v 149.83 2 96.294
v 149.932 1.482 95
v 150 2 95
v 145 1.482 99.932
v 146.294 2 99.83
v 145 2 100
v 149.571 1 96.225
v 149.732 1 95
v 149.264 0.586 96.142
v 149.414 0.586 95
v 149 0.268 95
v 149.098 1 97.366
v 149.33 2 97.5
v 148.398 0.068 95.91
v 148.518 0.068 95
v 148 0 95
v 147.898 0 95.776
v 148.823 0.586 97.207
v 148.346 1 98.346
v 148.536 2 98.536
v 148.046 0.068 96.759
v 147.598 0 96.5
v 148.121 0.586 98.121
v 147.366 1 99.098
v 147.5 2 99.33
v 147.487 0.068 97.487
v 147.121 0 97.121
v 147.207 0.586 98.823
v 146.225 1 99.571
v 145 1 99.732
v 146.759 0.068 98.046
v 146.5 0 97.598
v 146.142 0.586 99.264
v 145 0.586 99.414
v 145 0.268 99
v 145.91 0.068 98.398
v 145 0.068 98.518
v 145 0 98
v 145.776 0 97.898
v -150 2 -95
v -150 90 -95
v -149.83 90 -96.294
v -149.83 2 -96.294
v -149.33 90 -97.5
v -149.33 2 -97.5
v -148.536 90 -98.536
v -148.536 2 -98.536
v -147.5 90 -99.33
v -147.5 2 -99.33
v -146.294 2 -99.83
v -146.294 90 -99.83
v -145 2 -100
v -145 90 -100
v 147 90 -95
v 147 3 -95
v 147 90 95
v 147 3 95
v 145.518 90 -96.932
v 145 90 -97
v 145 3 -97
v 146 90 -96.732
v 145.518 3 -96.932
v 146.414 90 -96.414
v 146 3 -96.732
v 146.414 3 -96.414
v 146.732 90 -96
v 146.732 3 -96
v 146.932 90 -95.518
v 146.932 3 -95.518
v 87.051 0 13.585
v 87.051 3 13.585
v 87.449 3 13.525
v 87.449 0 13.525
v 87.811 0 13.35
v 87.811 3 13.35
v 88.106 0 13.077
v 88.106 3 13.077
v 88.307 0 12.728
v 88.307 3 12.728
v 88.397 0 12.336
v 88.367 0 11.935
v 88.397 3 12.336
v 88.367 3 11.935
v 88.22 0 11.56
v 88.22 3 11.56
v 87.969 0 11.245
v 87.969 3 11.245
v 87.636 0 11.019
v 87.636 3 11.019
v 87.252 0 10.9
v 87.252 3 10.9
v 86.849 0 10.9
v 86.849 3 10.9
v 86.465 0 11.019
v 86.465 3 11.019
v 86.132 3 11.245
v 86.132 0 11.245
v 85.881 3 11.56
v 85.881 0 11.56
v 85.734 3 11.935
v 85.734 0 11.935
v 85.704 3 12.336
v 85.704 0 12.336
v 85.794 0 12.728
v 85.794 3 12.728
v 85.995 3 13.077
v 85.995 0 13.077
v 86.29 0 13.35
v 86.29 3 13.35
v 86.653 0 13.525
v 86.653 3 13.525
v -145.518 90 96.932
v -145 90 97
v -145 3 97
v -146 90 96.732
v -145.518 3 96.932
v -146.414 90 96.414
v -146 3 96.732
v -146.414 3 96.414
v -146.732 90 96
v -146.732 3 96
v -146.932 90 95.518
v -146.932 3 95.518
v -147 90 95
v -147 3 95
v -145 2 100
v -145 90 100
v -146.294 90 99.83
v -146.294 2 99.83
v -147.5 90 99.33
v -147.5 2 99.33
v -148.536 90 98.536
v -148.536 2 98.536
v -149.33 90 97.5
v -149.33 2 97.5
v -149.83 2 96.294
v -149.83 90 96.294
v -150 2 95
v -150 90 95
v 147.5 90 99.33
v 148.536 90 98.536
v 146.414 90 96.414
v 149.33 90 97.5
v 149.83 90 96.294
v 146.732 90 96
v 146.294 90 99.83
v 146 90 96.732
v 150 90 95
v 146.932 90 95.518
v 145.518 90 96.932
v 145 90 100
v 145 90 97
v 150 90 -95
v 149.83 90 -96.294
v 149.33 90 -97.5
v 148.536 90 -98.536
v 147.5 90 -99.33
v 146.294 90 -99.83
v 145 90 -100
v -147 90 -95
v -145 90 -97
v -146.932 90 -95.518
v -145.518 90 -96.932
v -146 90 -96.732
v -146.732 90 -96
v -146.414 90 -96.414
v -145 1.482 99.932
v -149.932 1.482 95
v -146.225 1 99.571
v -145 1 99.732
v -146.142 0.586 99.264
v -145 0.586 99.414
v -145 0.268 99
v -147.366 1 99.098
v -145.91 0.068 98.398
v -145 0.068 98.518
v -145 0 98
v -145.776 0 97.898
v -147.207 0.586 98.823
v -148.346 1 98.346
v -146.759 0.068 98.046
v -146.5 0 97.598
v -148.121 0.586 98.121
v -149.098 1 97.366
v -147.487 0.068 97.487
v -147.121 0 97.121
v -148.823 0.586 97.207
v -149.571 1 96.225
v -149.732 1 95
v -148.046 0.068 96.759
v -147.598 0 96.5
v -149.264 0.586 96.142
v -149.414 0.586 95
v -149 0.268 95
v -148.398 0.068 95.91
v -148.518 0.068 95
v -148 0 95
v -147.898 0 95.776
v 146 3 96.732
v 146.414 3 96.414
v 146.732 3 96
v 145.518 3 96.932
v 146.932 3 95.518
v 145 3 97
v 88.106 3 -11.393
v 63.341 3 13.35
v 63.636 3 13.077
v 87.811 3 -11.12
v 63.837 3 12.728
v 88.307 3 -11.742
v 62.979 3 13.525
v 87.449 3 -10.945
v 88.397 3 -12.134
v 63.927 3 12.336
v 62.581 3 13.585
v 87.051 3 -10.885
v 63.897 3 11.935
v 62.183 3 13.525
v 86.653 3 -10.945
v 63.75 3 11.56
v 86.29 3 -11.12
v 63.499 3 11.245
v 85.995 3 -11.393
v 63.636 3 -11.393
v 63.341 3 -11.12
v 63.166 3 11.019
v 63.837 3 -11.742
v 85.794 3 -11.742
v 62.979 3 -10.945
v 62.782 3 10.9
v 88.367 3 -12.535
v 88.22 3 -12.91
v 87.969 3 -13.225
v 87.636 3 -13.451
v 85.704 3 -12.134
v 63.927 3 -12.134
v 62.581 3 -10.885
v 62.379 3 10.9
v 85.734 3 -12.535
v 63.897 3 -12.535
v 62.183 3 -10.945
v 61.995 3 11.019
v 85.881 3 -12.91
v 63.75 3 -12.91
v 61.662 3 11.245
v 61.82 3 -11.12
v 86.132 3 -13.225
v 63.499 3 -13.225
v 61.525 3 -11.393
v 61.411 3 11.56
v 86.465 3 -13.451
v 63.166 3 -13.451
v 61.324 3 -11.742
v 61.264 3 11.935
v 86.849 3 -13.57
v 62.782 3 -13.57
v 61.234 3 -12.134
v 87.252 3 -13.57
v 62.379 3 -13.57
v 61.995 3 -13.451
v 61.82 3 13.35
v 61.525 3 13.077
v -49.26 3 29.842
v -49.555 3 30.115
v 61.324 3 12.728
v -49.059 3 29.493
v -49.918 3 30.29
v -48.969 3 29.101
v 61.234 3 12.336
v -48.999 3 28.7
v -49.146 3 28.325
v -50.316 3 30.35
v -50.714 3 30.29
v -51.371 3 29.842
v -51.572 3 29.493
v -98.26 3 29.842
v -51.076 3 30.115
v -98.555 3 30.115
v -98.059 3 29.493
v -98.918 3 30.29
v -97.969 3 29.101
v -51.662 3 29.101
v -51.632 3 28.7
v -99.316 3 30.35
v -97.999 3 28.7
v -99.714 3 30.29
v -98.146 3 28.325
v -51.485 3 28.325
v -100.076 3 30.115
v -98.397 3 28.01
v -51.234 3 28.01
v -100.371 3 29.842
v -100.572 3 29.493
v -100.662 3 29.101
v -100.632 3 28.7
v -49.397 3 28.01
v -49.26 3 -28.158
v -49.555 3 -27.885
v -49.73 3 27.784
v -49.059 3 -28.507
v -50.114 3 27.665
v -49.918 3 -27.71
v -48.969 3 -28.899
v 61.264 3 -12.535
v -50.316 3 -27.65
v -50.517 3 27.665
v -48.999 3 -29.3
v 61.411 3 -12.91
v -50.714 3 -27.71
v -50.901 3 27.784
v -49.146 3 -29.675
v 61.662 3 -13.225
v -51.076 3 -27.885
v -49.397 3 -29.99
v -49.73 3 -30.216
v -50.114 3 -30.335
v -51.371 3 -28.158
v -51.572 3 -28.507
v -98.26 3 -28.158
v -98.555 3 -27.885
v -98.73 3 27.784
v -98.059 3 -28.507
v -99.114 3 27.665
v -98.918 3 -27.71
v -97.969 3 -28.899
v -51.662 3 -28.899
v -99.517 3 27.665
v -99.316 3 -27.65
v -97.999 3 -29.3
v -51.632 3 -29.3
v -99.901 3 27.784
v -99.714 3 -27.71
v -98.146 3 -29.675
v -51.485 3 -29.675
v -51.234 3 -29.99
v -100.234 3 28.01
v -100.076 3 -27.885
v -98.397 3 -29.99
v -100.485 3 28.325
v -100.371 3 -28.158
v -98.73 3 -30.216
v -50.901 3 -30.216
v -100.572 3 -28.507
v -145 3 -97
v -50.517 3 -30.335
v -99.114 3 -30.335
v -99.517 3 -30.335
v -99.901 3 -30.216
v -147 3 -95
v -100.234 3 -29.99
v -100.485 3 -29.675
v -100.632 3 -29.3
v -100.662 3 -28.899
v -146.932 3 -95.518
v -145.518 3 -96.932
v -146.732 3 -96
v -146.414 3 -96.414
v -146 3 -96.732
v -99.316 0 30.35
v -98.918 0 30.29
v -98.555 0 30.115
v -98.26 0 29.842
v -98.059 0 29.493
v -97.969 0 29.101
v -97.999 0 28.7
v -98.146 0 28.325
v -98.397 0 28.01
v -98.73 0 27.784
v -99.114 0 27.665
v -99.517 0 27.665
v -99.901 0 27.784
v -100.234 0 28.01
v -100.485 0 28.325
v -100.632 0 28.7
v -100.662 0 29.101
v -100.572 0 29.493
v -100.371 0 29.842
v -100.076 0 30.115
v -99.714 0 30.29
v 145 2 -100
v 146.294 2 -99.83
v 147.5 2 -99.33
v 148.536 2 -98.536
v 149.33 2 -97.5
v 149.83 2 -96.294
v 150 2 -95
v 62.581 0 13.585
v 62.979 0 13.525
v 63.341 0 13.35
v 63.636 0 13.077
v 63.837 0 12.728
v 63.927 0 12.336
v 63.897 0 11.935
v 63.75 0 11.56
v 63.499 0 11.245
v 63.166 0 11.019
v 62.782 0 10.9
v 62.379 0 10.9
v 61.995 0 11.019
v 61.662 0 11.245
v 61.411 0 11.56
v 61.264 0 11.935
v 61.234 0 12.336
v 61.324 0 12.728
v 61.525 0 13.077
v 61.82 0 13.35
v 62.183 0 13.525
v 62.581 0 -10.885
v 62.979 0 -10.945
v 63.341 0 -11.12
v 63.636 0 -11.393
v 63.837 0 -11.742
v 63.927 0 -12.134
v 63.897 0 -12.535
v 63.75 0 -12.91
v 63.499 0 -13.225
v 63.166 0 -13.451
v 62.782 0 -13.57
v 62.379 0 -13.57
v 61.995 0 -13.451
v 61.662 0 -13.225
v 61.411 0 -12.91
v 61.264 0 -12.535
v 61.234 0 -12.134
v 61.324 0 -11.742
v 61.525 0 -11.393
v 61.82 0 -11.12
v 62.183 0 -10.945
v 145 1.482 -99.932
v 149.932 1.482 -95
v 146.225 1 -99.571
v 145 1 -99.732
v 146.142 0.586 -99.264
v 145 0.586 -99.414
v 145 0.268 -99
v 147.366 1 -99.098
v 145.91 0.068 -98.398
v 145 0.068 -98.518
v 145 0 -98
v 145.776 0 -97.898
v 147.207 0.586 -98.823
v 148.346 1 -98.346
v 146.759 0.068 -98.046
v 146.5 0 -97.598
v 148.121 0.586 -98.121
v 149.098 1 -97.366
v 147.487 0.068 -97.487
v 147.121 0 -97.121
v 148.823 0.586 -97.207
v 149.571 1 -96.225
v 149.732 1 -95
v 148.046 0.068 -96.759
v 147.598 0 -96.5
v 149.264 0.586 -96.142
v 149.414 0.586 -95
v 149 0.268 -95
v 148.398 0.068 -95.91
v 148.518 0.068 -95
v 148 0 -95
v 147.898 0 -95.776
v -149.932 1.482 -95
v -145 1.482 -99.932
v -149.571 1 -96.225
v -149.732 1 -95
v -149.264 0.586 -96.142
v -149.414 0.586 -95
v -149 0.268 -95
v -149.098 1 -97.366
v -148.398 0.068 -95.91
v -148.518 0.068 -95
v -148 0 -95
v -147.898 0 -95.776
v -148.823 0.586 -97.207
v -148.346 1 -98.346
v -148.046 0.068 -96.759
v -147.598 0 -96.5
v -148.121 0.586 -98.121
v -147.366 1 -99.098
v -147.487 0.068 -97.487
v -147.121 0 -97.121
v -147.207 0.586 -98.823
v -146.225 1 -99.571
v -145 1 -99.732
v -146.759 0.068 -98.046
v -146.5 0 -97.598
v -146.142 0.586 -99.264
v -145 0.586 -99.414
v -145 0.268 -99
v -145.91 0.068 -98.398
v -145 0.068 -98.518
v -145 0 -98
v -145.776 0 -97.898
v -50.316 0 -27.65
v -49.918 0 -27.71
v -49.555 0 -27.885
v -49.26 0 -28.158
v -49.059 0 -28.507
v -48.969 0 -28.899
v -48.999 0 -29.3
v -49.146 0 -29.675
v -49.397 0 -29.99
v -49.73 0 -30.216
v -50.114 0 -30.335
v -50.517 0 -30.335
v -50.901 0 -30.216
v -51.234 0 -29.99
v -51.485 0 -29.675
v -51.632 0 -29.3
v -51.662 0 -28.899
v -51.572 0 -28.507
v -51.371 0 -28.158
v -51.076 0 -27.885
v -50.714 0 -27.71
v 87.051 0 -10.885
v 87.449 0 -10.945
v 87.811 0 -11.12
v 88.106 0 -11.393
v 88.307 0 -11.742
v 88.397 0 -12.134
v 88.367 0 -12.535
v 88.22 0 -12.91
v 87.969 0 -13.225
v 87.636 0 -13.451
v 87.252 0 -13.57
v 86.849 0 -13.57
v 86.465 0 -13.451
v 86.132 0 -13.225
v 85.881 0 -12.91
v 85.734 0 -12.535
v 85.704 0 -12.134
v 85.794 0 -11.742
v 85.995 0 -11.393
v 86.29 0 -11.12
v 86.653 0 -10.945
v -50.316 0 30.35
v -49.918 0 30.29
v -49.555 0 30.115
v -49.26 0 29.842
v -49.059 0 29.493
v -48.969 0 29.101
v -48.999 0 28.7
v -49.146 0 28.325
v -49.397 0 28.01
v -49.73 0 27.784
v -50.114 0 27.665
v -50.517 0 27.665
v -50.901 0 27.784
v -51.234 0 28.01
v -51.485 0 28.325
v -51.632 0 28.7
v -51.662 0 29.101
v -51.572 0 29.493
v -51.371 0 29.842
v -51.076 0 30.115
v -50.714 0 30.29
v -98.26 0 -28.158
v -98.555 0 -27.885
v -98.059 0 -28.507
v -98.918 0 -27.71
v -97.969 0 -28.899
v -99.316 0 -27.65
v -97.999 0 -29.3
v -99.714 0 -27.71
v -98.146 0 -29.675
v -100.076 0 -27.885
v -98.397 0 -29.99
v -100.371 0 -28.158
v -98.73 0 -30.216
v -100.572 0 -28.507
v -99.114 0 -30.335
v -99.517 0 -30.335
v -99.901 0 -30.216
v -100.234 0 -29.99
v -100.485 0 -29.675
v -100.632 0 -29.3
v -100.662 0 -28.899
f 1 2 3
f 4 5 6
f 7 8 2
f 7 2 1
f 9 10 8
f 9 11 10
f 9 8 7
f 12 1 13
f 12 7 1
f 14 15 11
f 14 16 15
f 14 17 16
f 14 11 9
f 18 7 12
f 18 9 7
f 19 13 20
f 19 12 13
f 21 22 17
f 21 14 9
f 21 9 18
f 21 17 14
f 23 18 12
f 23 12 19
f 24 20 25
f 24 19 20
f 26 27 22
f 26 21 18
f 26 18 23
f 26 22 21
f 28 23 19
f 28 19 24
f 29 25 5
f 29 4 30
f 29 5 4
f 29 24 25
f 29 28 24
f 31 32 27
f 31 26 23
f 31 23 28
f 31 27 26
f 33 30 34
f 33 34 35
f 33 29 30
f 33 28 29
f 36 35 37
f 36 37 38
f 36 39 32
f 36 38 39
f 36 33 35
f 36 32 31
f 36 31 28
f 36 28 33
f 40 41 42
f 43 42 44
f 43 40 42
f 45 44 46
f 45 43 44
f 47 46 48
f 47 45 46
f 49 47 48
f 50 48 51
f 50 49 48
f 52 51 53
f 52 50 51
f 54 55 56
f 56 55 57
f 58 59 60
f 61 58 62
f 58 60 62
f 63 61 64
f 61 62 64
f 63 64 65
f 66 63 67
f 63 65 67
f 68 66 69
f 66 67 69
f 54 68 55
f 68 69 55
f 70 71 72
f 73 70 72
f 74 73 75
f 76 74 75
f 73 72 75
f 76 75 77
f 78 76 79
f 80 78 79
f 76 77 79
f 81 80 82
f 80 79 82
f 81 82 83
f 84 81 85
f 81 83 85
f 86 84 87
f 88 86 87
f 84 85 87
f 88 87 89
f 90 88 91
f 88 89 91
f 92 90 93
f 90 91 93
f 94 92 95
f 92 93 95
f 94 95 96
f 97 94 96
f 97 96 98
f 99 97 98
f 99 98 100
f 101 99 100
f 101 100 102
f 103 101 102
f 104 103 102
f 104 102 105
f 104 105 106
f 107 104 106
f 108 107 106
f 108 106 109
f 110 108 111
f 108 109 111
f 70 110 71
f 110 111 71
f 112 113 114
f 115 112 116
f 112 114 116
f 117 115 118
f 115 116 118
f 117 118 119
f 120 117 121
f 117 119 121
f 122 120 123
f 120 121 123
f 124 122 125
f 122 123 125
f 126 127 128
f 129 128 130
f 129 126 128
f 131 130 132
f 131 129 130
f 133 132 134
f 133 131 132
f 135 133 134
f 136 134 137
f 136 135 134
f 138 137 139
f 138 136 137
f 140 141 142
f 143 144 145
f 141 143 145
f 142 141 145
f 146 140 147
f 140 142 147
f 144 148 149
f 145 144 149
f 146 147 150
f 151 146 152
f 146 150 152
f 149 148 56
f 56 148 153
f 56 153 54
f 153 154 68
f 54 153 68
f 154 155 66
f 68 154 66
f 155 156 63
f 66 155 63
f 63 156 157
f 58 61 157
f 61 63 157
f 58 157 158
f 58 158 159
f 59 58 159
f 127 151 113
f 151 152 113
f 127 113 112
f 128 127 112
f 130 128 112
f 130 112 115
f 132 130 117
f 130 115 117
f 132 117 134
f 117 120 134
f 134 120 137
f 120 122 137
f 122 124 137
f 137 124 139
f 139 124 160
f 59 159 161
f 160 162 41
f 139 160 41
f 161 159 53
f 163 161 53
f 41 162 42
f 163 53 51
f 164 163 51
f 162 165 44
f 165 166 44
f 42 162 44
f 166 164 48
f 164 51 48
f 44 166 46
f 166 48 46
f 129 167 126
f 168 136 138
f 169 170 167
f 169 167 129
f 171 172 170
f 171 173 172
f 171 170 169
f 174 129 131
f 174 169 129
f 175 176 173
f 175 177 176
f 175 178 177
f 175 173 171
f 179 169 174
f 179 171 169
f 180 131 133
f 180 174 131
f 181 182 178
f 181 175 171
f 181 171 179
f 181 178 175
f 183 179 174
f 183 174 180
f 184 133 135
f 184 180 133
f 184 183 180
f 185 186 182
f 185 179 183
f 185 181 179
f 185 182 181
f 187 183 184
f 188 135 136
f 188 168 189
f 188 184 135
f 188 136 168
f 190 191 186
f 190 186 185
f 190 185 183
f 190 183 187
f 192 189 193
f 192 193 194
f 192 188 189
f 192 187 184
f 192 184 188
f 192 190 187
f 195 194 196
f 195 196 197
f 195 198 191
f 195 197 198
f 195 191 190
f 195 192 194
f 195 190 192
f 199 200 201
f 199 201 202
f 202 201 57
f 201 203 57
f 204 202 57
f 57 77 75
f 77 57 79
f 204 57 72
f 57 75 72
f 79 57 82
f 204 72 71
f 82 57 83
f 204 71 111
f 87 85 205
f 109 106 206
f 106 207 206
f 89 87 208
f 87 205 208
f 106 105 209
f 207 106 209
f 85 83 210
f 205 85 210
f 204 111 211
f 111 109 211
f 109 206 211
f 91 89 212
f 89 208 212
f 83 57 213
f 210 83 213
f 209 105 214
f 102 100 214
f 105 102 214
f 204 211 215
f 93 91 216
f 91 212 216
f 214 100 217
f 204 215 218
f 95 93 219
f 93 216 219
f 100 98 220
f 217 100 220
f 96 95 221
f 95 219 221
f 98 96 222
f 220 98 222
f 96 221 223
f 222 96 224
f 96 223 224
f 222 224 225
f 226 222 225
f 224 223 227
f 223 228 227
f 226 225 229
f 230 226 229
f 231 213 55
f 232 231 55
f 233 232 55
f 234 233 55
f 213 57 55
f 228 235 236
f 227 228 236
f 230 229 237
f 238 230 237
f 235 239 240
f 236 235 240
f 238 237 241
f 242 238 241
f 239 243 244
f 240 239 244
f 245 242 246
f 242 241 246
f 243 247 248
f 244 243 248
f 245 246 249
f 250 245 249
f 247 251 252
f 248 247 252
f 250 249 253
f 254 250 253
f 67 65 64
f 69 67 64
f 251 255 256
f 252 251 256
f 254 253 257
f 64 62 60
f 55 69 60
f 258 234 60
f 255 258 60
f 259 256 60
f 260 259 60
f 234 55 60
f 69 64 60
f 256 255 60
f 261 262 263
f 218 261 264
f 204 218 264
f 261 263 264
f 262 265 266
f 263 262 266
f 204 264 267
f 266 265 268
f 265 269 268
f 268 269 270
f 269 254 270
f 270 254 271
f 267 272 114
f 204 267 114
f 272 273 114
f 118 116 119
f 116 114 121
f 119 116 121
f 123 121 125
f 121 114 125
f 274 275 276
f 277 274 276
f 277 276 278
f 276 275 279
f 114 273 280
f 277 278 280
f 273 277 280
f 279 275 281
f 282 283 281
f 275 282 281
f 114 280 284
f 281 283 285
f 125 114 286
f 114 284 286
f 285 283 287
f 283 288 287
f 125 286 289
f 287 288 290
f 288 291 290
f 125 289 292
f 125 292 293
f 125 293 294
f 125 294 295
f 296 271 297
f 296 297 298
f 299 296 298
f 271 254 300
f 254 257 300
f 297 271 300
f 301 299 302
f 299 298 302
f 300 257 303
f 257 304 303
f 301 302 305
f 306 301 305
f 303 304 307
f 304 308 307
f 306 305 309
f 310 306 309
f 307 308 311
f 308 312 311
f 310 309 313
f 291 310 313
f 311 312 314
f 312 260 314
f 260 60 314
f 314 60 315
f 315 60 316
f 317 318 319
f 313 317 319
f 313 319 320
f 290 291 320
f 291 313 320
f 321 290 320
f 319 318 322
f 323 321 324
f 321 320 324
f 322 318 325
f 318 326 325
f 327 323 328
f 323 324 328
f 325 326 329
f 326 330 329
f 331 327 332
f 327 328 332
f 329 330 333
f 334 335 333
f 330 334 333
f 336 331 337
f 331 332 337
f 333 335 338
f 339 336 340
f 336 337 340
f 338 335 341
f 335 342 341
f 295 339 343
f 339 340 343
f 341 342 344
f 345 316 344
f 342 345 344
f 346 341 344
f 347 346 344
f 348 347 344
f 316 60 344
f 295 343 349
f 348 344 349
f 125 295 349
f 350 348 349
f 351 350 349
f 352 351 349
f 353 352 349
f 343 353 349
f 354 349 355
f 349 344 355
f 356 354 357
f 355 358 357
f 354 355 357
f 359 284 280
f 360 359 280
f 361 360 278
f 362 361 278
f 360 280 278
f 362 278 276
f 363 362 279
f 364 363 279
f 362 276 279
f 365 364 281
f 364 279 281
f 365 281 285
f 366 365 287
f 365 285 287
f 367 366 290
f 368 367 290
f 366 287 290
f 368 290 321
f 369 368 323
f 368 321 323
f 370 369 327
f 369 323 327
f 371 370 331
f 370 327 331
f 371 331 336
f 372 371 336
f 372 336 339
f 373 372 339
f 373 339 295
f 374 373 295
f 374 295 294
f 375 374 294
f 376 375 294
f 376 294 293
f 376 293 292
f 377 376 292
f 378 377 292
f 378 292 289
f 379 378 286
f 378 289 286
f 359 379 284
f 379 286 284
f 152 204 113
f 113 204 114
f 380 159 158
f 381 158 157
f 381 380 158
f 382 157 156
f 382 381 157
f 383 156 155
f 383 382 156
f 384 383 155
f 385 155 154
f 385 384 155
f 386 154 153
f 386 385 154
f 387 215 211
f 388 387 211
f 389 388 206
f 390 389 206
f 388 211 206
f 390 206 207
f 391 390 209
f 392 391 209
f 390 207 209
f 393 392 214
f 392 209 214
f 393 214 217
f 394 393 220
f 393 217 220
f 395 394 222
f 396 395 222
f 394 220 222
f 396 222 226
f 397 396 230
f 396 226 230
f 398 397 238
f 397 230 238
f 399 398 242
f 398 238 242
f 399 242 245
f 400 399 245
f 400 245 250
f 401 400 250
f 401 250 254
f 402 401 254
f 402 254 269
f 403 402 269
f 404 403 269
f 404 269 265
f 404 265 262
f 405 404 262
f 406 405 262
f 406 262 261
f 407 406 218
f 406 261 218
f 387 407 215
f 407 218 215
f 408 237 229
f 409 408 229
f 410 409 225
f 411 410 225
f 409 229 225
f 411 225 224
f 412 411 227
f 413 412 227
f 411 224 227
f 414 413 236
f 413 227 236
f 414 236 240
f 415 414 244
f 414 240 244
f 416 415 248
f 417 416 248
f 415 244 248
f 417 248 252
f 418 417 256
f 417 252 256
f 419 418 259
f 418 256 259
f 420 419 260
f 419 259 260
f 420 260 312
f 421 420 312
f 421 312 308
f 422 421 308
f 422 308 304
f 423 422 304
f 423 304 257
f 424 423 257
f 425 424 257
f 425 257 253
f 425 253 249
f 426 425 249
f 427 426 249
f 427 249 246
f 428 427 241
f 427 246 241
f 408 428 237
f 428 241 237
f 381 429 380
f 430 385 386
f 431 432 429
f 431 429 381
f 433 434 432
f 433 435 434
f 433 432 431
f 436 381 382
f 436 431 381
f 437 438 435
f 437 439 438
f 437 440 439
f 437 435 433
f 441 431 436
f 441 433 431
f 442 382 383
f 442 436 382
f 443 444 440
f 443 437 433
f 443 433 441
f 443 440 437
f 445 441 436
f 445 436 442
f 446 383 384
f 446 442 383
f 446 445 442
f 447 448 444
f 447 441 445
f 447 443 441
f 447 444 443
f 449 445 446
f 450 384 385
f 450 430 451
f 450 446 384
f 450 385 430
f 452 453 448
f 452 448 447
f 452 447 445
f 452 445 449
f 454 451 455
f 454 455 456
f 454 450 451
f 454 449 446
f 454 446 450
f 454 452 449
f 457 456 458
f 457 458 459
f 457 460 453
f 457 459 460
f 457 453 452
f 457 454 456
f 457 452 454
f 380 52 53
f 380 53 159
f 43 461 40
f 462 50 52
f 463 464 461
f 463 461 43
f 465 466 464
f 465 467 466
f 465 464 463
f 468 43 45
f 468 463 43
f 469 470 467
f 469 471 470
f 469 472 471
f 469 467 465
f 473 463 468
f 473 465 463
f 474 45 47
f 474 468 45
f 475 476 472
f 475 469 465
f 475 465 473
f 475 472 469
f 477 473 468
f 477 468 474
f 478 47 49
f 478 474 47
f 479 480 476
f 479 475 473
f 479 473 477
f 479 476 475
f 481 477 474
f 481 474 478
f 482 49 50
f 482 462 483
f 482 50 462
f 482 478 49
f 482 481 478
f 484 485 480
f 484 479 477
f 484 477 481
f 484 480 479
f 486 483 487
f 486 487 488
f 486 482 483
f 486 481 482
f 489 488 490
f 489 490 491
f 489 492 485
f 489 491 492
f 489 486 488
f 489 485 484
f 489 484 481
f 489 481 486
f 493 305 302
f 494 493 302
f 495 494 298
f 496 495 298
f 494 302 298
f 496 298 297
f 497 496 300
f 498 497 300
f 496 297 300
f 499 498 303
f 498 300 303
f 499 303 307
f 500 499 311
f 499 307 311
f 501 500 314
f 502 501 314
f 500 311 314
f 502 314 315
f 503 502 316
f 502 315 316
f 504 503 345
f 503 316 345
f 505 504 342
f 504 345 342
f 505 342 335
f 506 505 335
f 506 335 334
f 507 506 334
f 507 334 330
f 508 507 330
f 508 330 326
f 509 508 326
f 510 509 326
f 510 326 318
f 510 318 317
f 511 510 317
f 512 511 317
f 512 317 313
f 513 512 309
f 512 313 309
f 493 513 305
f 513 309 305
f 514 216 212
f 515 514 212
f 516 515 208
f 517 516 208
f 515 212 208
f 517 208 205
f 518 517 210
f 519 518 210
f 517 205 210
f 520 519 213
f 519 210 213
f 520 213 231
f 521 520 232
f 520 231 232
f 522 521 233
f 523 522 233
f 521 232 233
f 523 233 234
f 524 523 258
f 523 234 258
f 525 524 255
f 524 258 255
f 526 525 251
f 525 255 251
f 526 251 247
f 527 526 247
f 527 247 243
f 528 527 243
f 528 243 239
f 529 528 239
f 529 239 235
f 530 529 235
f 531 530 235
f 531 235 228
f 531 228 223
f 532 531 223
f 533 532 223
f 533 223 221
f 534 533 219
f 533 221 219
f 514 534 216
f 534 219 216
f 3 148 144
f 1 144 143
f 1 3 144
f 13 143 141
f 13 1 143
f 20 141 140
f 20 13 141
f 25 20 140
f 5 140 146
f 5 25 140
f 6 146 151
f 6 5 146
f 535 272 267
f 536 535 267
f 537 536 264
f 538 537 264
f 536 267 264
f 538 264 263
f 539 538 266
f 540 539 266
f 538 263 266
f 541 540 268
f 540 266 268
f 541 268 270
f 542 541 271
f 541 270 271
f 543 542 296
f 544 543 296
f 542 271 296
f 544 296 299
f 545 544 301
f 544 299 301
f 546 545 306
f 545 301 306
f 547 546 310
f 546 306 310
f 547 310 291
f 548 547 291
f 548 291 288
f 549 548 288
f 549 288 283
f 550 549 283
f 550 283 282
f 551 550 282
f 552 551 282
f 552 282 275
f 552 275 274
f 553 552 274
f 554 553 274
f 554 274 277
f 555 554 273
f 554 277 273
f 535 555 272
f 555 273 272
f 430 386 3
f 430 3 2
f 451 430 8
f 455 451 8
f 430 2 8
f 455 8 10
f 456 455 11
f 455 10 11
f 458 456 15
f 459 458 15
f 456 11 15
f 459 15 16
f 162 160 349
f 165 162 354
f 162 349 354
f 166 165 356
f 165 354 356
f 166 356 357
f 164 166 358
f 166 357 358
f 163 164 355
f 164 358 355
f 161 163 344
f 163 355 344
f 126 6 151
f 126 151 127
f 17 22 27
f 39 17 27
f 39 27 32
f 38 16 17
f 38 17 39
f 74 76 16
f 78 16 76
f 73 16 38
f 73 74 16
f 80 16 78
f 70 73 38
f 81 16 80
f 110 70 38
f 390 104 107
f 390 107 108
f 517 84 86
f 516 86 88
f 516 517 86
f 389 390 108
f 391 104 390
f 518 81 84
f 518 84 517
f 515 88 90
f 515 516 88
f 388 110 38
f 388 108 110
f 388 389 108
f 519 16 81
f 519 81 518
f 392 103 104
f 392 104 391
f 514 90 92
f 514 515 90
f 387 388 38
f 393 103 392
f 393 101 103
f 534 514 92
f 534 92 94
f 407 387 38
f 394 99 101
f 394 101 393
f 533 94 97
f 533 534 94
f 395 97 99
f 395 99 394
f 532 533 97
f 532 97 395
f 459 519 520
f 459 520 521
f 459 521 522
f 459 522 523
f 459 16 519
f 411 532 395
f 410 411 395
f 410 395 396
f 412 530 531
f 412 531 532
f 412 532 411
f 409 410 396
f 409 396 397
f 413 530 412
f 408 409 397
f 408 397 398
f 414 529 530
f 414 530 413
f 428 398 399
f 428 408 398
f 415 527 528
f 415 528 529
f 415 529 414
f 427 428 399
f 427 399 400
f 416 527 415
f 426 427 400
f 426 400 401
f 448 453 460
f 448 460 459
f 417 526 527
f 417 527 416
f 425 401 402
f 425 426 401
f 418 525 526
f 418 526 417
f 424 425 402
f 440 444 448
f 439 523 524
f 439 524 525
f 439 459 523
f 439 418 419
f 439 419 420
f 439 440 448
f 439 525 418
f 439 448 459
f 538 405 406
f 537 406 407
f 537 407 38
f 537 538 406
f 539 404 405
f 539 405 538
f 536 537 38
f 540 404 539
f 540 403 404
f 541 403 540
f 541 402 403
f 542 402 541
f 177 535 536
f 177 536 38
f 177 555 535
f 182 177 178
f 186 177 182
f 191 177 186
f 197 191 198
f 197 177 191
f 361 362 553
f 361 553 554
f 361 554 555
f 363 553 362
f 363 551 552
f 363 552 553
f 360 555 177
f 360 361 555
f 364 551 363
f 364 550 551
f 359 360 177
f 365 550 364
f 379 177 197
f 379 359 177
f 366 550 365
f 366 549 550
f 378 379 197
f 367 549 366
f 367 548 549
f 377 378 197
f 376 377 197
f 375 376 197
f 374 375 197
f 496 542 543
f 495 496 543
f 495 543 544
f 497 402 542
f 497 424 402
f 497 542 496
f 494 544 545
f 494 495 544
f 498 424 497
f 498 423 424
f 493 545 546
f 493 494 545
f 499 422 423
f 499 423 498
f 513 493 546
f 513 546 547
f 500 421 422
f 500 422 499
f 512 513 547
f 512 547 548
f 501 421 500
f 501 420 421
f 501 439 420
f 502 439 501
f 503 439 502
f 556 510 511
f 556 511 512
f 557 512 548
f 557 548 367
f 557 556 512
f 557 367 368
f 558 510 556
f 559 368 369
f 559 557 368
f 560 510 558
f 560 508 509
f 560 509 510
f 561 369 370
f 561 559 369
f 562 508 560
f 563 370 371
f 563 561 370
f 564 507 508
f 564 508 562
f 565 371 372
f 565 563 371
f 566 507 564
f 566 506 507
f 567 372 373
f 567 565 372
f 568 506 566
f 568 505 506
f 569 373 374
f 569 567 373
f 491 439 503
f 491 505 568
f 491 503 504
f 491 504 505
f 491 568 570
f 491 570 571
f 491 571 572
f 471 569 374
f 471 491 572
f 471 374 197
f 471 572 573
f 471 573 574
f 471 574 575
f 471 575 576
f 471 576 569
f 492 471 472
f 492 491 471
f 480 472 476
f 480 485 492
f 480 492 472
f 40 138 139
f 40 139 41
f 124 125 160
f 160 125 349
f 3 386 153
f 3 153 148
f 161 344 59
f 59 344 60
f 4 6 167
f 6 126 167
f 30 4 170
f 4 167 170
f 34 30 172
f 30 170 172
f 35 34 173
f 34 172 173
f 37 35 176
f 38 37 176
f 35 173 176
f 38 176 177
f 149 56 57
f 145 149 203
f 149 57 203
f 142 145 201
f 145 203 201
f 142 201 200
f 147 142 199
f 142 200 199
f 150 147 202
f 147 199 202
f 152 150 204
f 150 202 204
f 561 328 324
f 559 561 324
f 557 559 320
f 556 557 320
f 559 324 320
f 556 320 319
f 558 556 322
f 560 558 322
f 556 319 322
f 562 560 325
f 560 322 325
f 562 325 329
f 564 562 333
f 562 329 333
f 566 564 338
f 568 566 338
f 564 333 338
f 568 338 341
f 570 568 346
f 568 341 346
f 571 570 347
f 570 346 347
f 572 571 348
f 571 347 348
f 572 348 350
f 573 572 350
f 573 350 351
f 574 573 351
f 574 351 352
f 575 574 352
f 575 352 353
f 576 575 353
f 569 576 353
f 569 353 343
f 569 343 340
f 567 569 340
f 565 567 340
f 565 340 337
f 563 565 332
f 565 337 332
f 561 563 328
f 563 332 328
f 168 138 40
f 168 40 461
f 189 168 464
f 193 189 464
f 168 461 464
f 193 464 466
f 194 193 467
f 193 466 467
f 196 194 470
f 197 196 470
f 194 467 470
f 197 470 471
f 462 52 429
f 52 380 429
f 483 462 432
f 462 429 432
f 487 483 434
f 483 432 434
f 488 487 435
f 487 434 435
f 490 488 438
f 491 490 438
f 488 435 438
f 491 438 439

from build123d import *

# Parameters (mm, degrees)
BOSS_EXTRUDE1_DEPTH = 90
SHELL1_T            = -3
FILLET1_R           = 2
SKETCH3_R           = 1.35
CUT_EXTRUDE1_DEPTH  = 3


with BuildPart() as part:
    # Sketch2 → Boss-Extrude1 (new body)
    with BuildSketch(Plane(origin=(0, 0, 0), x_dir=(1, 0, 0), z_dir=(0, 1, 0))):
        with BuildLine():
            Line((-145, 100), (145, 100))
            ThreePointArc((145, 100), (148.535533906, 98.535533906), (150, 95))
            Line((150, 95), (150, -95))
            ThreePointArc((150, -95), (148.535533906, -98.535533906), (145, -100))
            Line((145, -100), (-145, -100))
            ThreePointArc((-145, -100), (-148.535533906, -98.535533906), (-150, -95))
            Line((-150, -95), (-150, 95))
            ThreePointArc((-150, 95), (-148.535533906, 98.535533906), (-145, 100))
        make_face()
    extrude(amount=BOSS_EXTRUDE1_DEPTH)

    # Shell1
    shell1_openings = [part.faces().sort_by_distance(p)[0] for p in [
        (0, 90, 0),
    ]]
    offset(amount=SHELL1_T, openings=shell1_openings, kind=Kind.INTERSECTION)

    # Fillet1
    fillet1_edges = [part.edges().sort_by_distance(p)[0] for p in [
        (150, 0, 0),
        (148.535533906, 0, 98.535533906),
        (0, 0, 100),
        (-148.535533906, 0, 98.535533906),
        (-150, 0, 0),
        (-148.535533906, 0, -98.535533906),
        (0, 0, -100),
        (148.535533906, 0, -98.535533906),
    ]]
    fillet(fillet1_edges, radius=FILLET1_R)

    # Sketch3 → Cut-Extrude1 (cut)
    with BuildSketch(Plane(origin=(0, 3, 0), x_dir=(1, 0, 0), z_dir=(0, 1, 0))):
        with Locations(Location((-99.315591438, -29, 0), (0, 0, 270))):
            Circle(SKETCH3_R)
        with Locations(Location((-50.315591438, -29, 0), (0, 0, 270))):
            Circle(SKETCH3_R)
        with Locations(Location((-50.315591438, 29, 0), (0, 0, 270))):
            Circle(SKETCH3_R)
        with Locations(Location((-99.315591438, 29, 0), (0, 0, 270))):
            Circle(SKETCH3_R)
        with Locations(Location((87.050591438, -12.235, 0), (0, 0, 270))):
            Circle(SKETCH3_R)
        with Locations(Location((87.050591438, 12.235, 0), (0, 0, 270))):
            Circle(SKETCH3_R)
        with Locations(Location((62.580591438, 12.235, 0), (0, 0, 270))):
            Circle(SKETCH3_R)
        with Locations(Location((62.580591438, -12.235, 0), (0, 0, 270))):
            Circle(SKETCH3_R)
    extrude(amount=-CUT_EXTRUDE1_DEPTH, mode=Mode.SUBTRACT)


solid = part.part
